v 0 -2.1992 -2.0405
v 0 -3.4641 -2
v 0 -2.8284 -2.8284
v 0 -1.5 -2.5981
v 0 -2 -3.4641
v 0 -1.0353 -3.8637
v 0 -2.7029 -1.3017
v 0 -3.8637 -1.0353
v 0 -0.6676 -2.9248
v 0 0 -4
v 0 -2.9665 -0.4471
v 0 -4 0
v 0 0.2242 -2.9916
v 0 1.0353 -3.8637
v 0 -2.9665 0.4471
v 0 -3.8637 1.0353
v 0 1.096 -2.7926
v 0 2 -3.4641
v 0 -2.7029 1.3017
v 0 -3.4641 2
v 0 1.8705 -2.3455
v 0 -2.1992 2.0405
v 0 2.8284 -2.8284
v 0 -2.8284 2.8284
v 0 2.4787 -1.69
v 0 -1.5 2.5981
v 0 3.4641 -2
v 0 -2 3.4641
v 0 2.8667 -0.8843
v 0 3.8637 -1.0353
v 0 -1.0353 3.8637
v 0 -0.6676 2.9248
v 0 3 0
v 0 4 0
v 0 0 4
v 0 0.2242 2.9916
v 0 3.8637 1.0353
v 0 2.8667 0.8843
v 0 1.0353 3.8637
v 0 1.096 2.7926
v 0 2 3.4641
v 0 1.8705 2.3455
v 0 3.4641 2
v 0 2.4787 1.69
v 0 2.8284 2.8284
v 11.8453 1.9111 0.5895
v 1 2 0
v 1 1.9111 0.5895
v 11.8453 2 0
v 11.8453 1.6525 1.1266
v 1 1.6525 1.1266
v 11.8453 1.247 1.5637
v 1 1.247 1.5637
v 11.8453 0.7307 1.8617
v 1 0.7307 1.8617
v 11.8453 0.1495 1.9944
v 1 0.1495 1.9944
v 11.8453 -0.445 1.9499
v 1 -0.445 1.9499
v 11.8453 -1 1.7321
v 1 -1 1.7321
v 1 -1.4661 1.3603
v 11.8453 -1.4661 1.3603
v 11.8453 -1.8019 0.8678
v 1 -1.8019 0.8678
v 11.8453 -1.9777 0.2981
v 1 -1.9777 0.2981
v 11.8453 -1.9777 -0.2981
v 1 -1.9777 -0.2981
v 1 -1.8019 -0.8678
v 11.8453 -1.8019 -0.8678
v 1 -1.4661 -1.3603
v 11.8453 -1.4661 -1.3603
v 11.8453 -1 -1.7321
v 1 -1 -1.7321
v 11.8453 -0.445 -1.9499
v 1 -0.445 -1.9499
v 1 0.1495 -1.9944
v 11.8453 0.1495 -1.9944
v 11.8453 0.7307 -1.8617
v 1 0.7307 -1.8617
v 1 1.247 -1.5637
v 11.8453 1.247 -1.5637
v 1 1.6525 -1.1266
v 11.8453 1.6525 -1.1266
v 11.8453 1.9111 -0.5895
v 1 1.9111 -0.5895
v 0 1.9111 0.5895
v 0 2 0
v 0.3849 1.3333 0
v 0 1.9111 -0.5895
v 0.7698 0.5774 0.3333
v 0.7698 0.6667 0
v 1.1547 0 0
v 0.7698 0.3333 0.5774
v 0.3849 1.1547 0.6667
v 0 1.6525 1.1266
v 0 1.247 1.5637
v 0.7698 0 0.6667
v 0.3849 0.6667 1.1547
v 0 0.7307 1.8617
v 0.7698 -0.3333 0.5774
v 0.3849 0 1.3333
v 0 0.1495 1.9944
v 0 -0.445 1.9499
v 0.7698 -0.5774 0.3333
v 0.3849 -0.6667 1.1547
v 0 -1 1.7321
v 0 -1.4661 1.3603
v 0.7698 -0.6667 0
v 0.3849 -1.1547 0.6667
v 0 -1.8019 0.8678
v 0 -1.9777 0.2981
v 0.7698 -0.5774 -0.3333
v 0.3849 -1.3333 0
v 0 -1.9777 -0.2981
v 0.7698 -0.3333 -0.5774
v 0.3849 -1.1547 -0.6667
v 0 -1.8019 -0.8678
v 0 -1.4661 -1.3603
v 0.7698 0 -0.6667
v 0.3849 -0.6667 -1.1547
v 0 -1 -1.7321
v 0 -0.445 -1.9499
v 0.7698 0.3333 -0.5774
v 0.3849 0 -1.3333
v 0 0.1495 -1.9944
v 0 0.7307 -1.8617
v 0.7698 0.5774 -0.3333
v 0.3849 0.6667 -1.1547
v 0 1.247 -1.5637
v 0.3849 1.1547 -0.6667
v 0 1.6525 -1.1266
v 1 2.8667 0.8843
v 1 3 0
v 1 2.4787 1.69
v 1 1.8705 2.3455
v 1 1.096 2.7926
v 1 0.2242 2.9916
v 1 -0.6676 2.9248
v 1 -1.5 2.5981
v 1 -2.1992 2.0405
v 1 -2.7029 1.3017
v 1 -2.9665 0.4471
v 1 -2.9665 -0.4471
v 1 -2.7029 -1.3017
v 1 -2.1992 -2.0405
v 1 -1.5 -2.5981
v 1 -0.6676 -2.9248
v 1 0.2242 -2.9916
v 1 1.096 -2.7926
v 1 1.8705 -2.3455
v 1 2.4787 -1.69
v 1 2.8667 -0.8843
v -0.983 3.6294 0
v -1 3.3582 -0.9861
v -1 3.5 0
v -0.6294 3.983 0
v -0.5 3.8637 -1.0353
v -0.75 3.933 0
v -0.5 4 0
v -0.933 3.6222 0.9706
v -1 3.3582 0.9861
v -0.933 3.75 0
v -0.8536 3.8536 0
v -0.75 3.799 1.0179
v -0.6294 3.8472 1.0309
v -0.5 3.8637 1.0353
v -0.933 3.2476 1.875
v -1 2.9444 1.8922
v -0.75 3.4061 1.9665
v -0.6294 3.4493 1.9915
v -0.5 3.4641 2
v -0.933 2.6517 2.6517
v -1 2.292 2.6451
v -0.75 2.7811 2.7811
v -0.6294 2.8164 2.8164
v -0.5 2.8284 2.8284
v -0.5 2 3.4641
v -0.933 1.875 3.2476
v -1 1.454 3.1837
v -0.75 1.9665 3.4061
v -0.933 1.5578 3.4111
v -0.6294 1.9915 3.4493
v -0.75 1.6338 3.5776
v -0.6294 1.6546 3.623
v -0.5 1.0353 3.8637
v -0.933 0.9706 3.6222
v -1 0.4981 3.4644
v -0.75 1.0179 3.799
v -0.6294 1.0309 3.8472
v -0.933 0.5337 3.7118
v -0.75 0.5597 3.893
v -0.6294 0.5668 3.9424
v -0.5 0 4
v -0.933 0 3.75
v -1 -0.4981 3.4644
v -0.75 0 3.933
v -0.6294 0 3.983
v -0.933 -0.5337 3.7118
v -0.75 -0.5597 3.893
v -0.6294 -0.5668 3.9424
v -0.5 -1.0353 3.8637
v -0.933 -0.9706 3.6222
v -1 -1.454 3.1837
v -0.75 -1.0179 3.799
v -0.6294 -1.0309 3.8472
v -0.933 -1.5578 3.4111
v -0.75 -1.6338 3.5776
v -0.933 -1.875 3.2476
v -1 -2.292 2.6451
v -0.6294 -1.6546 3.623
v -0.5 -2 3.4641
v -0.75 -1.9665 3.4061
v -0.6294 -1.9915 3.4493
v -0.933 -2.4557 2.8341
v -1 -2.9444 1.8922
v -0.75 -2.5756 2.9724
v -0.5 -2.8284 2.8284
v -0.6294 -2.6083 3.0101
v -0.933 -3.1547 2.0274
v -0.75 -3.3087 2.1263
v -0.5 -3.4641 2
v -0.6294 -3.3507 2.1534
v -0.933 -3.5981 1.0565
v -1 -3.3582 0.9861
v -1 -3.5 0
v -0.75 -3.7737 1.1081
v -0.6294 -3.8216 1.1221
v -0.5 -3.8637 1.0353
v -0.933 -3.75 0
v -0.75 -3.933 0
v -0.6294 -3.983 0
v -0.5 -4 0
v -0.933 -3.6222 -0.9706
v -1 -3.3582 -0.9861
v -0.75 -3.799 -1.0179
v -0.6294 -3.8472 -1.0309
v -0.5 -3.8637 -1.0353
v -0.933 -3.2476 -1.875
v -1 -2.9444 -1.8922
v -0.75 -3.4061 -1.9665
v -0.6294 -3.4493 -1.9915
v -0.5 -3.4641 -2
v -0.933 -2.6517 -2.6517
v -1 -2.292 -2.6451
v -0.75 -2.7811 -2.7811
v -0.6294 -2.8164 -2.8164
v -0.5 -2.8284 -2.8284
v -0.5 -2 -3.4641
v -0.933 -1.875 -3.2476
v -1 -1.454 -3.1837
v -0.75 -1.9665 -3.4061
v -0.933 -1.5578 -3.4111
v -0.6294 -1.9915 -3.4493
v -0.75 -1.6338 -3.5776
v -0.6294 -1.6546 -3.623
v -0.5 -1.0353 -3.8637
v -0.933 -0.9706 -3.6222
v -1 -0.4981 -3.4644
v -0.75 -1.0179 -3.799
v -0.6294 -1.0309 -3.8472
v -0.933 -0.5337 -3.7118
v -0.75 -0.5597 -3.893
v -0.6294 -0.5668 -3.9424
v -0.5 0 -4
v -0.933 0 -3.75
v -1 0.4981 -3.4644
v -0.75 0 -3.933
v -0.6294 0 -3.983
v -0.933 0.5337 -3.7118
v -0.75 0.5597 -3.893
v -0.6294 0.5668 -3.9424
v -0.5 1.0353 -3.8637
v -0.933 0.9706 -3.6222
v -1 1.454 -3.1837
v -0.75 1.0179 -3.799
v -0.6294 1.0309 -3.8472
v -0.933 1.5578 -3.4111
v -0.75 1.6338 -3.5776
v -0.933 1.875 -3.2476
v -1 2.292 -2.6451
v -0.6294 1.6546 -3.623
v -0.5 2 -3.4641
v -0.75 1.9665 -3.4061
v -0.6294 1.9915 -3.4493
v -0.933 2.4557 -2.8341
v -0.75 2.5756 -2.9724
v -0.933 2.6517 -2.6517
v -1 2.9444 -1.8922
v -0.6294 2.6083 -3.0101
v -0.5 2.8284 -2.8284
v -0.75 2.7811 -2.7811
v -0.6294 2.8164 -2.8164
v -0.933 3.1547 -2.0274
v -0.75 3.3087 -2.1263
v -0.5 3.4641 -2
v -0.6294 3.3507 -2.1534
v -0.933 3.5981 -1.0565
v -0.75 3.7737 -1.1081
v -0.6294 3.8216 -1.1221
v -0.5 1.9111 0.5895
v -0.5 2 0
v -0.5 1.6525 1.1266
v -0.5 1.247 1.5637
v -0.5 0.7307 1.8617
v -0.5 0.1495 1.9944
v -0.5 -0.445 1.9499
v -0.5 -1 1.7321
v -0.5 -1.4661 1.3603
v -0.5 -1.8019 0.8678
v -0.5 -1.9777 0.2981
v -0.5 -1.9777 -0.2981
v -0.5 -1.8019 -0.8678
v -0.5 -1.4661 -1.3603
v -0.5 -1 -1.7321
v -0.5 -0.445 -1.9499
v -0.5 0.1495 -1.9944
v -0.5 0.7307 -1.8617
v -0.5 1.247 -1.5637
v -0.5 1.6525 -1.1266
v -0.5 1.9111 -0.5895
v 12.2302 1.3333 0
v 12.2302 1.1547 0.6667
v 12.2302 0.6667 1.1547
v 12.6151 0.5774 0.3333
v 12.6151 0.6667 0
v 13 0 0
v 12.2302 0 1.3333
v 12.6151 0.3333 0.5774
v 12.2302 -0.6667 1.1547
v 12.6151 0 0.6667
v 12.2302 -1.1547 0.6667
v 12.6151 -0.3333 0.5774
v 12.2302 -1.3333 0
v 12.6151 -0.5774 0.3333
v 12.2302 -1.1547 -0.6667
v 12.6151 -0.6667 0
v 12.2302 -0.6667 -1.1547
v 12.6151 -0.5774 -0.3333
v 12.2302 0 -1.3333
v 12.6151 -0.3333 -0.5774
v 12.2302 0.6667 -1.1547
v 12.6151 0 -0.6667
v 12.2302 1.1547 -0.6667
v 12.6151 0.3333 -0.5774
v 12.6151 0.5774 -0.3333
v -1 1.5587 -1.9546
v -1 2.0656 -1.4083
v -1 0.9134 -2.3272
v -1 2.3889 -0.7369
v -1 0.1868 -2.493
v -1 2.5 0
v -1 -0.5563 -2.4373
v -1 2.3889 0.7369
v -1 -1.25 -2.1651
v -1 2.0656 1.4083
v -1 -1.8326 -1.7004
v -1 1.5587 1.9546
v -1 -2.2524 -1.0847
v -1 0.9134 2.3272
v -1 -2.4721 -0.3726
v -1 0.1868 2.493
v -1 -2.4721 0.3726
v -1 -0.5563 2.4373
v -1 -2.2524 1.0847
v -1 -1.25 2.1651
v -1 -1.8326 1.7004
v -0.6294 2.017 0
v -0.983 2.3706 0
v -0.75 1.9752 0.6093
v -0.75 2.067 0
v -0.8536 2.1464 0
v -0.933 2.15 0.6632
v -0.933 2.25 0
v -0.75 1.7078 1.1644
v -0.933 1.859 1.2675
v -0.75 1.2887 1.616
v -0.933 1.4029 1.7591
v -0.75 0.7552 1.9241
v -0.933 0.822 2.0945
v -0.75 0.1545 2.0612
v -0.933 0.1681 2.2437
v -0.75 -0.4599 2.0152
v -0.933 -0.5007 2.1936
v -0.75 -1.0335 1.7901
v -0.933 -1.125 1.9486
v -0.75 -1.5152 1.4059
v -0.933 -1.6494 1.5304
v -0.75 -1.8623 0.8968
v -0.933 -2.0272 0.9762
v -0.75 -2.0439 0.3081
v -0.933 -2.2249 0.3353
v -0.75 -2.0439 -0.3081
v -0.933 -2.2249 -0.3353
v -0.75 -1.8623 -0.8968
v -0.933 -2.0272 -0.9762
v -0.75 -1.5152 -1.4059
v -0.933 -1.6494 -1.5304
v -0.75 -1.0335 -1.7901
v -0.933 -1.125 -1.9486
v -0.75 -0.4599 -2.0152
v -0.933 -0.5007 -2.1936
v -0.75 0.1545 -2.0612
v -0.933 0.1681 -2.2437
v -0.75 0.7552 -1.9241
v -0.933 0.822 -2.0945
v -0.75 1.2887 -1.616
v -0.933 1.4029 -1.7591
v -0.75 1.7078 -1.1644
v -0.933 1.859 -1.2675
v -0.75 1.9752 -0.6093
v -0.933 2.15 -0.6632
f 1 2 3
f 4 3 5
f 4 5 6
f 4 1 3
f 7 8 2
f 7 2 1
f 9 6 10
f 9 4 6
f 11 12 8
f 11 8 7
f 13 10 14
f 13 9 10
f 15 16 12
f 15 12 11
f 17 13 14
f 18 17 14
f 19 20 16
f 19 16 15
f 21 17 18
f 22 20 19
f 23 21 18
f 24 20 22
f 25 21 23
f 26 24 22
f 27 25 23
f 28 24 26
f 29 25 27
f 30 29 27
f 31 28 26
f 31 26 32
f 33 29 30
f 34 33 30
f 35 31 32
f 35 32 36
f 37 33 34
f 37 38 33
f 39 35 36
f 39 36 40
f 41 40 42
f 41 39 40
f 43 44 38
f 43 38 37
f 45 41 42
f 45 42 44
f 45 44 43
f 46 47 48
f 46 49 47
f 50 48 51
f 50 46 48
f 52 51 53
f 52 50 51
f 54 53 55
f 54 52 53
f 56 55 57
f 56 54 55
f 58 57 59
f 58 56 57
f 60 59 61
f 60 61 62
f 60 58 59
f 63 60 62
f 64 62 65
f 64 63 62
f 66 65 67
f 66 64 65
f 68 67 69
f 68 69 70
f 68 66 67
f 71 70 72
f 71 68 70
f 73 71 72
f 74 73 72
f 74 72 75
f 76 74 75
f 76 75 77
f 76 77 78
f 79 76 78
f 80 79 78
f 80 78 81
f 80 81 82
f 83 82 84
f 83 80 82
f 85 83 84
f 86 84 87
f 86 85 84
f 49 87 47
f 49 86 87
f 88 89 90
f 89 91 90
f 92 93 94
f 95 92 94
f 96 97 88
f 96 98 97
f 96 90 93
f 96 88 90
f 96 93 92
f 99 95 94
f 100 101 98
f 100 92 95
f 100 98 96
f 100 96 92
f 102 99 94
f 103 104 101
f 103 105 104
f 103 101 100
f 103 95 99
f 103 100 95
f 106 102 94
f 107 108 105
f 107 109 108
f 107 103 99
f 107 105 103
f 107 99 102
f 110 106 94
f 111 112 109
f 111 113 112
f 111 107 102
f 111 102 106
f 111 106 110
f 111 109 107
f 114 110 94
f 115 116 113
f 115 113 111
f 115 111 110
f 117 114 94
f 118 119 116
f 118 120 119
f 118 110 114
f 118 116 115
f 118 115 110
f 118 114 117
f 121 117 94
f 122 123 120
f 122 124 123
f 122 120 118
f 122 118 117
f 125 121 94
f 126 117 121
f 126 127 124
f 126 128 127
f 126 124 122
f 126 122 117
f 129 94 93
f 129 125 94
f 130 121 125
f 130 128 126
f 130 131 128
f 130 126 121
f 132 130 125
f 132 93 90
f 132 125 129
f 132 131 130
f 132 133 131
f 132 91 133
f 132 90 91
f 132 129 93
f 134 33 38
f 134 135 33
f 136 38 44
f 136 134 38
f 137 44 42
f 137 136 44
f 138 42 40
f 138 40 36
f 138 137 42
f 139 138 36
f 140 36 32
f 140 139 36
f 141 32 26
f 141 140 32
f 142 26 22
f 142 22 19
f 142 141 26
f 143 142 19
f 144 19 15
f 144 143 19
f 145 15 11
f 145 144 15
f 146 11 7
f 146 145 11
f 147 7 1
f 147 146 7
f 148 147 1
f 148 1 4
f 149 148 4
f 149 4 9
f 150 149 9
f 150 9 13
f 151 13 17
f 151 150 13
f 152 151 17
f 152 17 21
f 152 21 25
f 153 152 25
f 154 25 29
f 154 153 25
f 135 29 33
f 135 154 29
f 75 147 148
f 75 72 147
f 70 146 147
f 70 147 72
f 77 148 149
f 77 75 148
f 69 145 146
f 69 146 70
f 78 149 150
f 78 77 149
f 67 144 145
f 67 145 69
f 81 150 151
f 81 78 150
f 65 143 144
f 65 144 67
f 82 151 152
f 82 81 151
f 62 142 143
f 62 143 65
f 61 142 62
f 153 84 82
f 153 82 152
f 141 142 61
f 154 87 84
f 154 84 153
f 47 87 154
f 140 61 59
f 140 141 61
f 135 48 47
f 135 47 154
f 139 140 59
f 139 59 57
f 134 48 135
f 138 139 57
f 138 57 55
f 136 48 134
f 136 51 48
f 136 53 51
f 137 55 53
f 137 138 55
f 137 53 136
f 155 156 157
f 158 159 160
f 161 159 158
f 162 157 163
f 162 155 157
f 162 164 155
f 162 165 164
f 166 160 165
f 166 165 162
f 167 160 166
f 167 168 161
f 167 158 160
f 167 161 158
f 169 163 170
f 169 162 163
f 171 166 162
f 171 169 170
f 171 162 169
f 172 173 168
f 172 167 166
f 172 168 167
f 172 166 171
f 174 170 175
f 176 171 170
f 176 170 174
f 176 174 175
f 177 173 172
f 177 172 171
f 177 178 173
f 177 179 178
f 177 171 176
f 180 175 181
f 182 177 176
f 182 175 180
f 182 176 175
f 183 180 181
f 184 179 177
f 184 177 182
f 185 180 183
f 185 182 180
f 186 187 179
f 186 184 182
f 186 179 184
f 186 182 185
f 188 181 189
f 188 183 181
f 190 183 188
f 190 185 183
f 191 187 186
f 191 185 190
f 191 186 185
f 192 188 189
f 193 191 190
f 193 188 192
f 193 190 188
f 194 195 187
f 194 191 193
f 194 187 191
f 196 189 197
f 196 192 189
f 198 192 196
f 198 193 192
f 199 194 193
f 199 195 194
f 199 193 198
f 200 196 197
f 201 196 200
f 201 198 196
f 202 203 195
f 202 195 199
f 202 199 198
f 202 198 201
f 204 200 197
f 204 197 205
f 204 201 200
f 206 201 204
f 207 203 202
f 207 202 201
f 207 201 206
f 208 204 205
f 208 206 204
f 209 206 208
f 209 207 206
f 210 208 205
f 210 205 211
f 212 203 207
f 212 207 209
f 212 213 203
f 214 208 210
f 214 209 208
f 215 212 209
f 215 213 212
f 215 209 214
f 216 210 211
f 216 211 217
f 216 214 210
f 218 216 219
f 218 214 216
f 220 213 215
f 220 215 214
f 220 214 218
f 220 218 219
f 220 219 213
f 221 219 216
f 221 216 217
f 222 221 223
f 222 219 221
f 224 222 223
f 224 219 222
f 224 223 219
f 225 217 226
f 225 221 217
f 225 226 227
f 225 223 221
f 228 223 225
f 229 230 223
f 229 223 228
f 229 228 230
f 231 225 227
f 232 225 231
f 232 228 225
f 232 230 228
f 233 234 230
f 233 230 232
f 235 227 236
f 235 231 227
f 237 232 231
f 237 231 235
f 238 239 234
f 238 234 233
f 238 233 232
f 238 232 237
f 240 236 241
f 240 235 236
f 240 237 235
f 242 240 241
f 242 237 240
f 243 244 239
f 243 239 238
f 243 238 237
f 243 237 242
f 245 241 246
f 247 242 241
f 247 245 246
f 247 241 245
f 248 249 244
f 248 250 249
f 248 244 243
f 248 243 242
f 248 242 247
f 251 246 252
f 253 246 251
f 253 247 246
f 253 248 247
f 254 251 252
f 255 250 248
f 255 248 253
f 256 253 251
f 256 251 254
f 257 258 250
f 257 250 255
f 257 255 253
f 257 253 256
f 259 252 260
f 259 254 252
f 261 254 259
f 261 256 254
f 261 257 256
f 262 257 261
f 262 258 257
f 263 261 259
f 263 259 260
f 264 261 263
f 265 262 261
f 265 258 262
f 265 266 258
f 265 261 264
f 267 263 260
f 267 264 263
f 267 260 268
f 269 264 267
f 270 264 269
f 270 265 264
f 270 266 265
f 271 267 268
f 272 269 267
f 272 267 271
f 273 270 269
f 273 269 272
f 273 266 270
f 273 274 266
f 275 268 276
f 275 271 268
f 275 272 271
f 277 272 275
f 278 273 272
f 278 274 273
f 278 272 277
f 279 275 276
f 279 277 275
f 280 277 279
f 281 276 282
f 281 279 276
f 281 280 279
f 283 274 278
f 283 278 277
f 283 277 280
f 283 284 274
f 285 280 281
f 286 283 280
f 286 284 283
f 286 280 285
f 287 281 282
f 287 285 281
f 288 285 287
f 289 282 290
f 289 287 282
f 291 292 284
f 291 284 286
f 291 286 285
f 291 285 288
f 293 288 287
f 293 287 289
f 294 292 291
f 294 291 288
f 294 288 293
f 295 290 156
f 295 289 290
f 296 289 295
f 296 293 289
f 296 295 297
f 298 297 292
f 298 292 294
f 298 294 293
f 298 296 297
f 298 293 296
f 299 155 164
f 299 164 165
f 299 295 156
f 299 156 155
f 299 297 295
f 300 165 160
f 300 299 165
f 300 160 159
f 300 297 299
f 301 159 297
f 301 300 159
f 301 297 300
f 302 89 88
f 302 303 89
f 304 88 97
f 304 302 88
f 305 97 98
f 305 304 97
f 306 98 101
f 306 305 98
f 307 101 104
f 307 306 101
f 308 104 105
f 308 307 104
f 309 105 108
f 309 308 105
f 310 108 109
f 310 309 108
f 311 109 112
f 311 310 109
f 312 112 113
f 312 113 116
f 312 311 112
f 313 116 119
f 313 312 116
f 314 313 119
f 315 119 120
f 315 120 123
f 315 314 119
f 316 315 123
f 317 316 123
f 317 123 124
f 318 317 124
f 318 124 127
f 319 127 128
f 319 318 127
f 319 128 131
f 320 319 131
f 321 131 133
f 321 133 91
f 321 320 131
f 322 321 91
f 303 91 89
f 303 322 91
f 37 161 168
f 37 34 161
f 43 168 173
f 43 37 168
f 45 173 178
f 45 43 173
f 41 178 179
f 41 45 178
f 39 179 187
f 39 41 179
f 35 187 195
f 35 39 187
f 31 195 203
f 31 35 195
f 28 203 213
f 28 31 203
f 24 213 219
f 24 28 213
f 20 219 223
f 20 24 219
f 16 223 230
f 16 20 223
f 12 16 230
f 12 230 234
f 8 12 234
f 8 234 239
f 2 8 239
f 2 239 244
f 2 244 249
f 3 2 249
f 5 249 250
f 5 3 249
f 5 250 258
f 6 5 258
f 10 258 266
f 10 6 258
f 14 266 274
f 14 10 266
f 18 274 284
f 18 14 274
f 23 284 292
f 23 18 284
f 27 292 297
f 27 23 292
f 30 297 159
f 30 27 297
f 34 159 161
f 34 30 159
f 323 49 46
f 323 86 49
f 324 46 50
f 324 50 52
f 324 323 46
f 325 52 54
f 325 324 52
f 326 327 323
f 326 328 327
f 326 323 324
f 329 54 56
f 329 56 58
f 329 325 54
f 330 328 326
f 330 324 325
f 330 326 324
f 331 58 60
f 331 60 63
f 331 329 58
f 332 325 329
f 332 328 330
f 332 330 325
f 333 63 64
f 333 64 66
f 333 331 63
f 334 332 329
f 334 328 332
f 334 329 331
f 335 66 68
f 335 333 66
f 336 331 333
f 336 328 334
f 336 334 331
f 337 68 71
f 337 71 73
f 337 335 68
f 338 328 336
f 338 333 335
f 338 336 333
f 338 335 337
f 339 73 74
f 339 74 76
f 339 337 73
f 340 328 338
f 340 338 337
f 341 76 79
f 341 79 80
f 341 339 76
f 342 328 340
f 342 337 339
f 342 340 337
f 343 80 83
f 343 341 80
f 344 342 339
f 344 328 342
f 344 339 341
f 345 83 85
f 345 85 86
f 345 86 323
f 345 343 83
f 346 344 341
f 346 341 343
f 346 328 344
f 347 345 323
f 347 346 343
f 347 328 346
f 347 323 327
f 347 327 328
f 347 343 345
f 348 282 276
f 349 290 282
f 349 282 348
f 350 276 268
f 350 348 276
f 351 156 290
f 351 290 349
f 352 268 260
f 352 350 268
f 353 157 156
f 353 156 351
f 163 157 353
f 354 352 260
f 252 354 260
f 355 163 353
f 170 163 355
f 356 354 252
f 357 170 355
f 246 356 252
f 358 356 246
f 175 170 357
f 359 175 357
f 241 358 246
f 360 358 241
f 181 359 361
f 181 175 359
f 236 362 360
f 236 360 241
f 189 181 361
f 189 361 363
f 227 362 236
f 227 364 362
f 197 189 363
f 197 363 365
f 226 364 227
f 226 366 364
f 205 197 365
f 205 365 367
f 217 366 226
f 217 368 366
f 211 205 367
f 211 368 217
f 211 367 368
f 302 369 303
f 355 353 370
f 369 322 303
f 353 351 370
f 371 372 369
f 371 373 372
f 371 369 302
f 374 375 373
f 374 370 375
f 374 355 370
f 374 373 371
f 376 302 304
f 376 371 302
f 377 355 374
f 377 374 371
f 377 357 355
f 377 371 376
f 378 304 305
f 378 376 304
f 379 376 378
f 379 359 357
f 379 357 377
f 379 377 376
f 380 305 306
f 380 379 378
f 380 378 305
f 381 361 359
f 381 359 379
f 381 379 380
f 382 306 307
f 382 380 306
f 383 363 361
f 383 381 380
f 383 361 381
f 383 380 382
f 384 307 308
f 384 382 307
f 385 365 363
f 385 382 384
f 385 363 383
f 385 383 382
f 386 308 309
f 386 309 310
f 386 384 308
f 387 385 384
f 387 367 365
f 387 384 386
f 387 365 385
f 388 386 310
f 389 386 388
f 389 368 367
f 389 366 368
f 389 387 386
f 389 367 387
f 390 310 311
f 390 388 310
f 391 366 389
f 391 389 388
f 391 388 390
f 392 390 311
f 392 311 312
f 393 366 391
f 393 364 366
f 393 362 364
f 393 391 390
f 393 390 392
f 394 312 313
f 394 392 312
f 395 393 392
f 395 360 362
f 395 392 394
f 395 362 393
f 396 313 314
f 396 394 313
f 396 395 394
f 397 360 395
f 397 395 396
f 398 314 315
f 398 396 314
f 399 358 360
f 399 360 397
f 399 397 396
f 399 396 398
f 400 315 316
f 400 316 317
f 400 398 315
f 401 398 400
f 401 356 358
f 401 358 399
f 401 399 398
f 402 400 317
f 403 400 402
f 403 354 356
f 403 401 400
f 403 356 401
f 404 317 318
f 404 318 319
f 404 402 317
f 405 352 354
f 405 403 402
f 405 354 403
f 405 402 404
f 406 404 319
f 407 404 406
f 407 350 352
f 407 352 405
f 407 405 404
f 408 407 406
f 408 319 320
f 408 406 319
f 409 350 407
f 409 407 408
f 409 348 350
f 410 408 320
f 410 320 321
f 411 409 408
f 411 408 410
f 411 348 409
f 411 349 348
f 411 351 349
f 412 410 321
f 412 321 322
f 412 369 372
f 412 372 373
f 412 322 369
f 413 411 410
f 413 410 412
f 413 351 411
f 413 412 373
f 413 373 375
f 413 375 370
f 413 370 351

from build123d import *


with BuildPart() as part:
    # Esquisse1 → Révolution1 (revolve)
    with BuildSketch(Plane.XY):
        with BuildLine():
            Line((0, 3), (1, 3))
            Line((1, 3), (1, 2))
            Line((1, 2), (11.845299462, 2))
            Line((11.845299462, 2), (13, 0))
            Line((13, 0), (1.154700538, 0))
            Line((1.154700538, 0), (0, 2))
            Line((0, 2), (-0.5, 2))
            ThreePointArc((-0.5, 2), (-0.853553391, 2.146446609), (-1, 2.5))
            Line((-1, 2.5), (-1, 3.5))
            ThreePointArc((-1, 3.5), (-0.853553391, 3.853553391), (-0.5, 4))
            Line((-0.5, 4), (0, 4))
            Line((0, 4), (0, 3))
        make_face()
    revolve(axis=Axis((-8.537570942, 0, 0), (1, 0, 0)))


solid = part.part
